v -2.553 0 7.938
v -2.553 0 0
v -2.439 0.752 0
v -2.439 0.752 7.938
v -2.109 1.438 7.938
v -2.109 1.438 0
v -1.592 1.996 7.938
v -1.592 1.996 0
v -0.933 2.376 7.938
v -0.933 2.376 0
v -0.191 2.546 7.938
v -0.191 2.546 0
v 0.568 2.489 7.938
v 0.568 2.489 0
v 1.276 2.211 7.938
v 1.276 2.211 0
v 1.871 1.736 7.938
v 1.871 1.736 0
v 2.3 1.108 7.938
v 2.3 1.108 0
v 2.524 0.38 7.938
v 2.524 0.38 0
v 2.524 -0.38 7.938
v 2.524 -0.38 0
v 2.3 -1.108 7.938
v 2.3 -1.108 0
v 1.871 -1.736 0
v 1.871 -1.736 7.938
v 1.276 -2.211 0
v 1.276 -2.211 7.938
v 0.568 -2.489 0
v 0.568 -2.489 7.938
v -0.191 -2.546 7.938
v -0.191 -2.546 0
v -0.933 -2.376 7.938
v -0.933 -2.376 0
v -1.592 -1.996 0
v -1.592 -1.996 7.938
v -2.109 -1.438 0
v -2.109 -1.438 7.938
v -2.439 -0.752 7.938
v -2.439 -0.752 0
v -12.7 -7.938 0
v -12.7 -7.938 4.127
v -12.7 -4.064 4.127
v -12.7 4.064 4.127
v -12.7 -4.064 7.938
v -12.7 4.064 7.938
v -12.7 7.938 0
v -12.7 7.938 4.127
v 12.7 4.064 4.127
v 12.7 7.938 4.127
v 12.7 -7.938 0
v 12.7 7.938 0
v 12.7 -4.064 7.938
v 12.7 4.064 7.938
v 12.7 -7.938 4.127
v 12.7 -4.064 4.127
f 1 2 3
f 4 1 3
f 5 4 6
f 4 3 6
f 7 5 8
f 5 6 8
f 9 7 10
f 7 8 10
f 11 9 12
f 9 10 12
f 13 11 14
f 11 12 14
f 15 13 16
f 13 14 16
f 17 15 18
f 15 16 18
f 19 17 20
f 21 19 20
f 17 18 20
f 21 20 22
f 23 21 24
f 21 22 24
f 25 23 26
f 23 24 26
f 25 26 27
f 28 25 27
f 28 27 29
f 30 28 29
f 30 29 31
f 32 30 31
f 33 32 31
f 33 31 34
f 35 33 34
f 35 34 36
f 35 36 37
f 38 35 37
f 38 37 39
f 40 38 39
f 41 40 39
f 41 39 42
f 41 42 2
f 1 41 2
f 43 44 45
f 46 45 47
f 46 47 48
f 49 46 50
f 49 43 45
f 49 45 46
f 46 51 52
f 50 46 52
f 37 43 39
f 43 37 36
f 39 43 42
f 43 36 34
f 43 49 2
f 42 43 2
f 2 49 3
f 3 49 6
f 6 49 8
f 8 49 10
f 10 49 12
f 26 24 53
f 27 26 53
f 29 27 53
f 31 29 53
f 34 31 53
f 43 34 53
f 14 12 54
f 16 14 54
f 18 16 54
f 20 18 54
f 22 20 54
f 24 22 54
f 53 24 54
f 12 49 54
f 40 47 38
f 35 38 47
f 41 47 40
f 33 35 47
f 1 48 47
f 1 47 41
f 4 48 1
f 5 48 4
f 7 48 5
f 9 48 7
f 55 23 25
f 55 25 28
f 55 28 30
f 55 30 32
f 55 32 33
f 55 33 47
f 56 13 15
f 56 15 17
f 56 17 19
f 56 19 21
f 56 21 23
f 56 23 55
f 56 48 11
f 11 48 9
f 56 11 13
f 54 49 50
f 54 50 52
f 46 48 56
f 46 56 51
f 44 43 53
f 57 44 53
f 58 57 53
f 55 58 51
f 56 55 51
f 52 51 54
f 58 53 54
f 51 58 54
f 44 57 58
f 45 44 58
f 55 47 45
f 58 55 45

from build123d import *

# Parameters (mm, degrees)
SKETCH1_W                   = 25.4
SKETCH1_H                   = 15.875
BOSS_EXTRUDE1_DEPTH         = 7.9375
CUT_EXTRUDE1_REACH          = 27.4
SKETCH2_W                   = 3.81
SKETCH2_H                   = 3.8735
F_1_4_20_TAPPED_HOLE1_D     = 5.1054
F_1_4_20_TAPPED_HOLE1_DEPTH = 16.51
F_1_4_20_TAPPED_HOLE1_TIP   = 1.533816902


with BuildPart() as part:
    # Sketch1 → Boss-Extrude1 (new body)
    with BuildSketch(Plane.XY):
        Rectangle(SKETCH1_W, SKETCH1_H)
    extrude(amount=BOSS_EXTRUDE1_DEPTH)

    # Sketch2 → Cut-Extrude1 (cut, up to next)
    with BuildSketch(Plane(origin=(12.7, 0, 0), x_dir=(0, 0, -1), z_dir=(1, 0, 0)), mode=Mode.PRIVATE) as cut_extrude1_sk1:
        with Locations((-6.0325, 6.00075)):
            Rectangle(SKETCH2_W, SKETCH2_H)
    cut_extrude1_tool1 = extrude(cut_extrude1_sk1.sketch, amount=-CUT_EXTRUDE1_REACH, mode=Mode.PRIVATE) & part.part
    add(cut_extrude1_tool1.solids().sort_by_distance((12.7, 6.00075, 6.0325))[0], mode=Mode.SUBTRACT)
    # Sketch2 → Cut-Extrude1 (cut, up to next)
    with BuildSketch(Plane(origin=(12.7, 0, 0), x_dir=(0, 0, -1), z_dir=(1, 0, 0)), mode=Mode.PRIVATE) as cut_extrude1_sk2:
        with Locations((-6.0325, -6.00075)):
            Rectangle(SKETCH2_W, SKETCH2_H)
    cut_extrude1_tool2 = extrude(cut_extrude1_sk2.sketch, amount=-CUT_EXTRUDE1_REACH, mode=Mode.PRIVATE) & part.part
    add(cut_extrude1_tool2.solids().sort_by_distance((12.7, -6.00075, 6.0325))[0], mode=Mode.SUBTRACT)

    # 1/4-20 Tapped Hole1
    with Locations(Plane.XY.offset(7.9375)):
        with Locations((0, 0)):
            Hole(F_1_4_20_TAPPED_HOLE1_D / 2, depth=F_1_4_20_TAPPED_HOLE1_DEPTH)
            with Locations((0, 0, -(F_1_4_20_TAPPED_HOLE1_DEPTH + F_1_4_20_TAPPED_HOLE1_TIP / 2))):  # 118° drill point
                Cone(0, F_1_4_20_TAPPED_HOLE1_D / 2, F_1_4_20_TAPPED_HOLE1_TIP, mode=Mode.SUBTRACT)


solid = part.part
